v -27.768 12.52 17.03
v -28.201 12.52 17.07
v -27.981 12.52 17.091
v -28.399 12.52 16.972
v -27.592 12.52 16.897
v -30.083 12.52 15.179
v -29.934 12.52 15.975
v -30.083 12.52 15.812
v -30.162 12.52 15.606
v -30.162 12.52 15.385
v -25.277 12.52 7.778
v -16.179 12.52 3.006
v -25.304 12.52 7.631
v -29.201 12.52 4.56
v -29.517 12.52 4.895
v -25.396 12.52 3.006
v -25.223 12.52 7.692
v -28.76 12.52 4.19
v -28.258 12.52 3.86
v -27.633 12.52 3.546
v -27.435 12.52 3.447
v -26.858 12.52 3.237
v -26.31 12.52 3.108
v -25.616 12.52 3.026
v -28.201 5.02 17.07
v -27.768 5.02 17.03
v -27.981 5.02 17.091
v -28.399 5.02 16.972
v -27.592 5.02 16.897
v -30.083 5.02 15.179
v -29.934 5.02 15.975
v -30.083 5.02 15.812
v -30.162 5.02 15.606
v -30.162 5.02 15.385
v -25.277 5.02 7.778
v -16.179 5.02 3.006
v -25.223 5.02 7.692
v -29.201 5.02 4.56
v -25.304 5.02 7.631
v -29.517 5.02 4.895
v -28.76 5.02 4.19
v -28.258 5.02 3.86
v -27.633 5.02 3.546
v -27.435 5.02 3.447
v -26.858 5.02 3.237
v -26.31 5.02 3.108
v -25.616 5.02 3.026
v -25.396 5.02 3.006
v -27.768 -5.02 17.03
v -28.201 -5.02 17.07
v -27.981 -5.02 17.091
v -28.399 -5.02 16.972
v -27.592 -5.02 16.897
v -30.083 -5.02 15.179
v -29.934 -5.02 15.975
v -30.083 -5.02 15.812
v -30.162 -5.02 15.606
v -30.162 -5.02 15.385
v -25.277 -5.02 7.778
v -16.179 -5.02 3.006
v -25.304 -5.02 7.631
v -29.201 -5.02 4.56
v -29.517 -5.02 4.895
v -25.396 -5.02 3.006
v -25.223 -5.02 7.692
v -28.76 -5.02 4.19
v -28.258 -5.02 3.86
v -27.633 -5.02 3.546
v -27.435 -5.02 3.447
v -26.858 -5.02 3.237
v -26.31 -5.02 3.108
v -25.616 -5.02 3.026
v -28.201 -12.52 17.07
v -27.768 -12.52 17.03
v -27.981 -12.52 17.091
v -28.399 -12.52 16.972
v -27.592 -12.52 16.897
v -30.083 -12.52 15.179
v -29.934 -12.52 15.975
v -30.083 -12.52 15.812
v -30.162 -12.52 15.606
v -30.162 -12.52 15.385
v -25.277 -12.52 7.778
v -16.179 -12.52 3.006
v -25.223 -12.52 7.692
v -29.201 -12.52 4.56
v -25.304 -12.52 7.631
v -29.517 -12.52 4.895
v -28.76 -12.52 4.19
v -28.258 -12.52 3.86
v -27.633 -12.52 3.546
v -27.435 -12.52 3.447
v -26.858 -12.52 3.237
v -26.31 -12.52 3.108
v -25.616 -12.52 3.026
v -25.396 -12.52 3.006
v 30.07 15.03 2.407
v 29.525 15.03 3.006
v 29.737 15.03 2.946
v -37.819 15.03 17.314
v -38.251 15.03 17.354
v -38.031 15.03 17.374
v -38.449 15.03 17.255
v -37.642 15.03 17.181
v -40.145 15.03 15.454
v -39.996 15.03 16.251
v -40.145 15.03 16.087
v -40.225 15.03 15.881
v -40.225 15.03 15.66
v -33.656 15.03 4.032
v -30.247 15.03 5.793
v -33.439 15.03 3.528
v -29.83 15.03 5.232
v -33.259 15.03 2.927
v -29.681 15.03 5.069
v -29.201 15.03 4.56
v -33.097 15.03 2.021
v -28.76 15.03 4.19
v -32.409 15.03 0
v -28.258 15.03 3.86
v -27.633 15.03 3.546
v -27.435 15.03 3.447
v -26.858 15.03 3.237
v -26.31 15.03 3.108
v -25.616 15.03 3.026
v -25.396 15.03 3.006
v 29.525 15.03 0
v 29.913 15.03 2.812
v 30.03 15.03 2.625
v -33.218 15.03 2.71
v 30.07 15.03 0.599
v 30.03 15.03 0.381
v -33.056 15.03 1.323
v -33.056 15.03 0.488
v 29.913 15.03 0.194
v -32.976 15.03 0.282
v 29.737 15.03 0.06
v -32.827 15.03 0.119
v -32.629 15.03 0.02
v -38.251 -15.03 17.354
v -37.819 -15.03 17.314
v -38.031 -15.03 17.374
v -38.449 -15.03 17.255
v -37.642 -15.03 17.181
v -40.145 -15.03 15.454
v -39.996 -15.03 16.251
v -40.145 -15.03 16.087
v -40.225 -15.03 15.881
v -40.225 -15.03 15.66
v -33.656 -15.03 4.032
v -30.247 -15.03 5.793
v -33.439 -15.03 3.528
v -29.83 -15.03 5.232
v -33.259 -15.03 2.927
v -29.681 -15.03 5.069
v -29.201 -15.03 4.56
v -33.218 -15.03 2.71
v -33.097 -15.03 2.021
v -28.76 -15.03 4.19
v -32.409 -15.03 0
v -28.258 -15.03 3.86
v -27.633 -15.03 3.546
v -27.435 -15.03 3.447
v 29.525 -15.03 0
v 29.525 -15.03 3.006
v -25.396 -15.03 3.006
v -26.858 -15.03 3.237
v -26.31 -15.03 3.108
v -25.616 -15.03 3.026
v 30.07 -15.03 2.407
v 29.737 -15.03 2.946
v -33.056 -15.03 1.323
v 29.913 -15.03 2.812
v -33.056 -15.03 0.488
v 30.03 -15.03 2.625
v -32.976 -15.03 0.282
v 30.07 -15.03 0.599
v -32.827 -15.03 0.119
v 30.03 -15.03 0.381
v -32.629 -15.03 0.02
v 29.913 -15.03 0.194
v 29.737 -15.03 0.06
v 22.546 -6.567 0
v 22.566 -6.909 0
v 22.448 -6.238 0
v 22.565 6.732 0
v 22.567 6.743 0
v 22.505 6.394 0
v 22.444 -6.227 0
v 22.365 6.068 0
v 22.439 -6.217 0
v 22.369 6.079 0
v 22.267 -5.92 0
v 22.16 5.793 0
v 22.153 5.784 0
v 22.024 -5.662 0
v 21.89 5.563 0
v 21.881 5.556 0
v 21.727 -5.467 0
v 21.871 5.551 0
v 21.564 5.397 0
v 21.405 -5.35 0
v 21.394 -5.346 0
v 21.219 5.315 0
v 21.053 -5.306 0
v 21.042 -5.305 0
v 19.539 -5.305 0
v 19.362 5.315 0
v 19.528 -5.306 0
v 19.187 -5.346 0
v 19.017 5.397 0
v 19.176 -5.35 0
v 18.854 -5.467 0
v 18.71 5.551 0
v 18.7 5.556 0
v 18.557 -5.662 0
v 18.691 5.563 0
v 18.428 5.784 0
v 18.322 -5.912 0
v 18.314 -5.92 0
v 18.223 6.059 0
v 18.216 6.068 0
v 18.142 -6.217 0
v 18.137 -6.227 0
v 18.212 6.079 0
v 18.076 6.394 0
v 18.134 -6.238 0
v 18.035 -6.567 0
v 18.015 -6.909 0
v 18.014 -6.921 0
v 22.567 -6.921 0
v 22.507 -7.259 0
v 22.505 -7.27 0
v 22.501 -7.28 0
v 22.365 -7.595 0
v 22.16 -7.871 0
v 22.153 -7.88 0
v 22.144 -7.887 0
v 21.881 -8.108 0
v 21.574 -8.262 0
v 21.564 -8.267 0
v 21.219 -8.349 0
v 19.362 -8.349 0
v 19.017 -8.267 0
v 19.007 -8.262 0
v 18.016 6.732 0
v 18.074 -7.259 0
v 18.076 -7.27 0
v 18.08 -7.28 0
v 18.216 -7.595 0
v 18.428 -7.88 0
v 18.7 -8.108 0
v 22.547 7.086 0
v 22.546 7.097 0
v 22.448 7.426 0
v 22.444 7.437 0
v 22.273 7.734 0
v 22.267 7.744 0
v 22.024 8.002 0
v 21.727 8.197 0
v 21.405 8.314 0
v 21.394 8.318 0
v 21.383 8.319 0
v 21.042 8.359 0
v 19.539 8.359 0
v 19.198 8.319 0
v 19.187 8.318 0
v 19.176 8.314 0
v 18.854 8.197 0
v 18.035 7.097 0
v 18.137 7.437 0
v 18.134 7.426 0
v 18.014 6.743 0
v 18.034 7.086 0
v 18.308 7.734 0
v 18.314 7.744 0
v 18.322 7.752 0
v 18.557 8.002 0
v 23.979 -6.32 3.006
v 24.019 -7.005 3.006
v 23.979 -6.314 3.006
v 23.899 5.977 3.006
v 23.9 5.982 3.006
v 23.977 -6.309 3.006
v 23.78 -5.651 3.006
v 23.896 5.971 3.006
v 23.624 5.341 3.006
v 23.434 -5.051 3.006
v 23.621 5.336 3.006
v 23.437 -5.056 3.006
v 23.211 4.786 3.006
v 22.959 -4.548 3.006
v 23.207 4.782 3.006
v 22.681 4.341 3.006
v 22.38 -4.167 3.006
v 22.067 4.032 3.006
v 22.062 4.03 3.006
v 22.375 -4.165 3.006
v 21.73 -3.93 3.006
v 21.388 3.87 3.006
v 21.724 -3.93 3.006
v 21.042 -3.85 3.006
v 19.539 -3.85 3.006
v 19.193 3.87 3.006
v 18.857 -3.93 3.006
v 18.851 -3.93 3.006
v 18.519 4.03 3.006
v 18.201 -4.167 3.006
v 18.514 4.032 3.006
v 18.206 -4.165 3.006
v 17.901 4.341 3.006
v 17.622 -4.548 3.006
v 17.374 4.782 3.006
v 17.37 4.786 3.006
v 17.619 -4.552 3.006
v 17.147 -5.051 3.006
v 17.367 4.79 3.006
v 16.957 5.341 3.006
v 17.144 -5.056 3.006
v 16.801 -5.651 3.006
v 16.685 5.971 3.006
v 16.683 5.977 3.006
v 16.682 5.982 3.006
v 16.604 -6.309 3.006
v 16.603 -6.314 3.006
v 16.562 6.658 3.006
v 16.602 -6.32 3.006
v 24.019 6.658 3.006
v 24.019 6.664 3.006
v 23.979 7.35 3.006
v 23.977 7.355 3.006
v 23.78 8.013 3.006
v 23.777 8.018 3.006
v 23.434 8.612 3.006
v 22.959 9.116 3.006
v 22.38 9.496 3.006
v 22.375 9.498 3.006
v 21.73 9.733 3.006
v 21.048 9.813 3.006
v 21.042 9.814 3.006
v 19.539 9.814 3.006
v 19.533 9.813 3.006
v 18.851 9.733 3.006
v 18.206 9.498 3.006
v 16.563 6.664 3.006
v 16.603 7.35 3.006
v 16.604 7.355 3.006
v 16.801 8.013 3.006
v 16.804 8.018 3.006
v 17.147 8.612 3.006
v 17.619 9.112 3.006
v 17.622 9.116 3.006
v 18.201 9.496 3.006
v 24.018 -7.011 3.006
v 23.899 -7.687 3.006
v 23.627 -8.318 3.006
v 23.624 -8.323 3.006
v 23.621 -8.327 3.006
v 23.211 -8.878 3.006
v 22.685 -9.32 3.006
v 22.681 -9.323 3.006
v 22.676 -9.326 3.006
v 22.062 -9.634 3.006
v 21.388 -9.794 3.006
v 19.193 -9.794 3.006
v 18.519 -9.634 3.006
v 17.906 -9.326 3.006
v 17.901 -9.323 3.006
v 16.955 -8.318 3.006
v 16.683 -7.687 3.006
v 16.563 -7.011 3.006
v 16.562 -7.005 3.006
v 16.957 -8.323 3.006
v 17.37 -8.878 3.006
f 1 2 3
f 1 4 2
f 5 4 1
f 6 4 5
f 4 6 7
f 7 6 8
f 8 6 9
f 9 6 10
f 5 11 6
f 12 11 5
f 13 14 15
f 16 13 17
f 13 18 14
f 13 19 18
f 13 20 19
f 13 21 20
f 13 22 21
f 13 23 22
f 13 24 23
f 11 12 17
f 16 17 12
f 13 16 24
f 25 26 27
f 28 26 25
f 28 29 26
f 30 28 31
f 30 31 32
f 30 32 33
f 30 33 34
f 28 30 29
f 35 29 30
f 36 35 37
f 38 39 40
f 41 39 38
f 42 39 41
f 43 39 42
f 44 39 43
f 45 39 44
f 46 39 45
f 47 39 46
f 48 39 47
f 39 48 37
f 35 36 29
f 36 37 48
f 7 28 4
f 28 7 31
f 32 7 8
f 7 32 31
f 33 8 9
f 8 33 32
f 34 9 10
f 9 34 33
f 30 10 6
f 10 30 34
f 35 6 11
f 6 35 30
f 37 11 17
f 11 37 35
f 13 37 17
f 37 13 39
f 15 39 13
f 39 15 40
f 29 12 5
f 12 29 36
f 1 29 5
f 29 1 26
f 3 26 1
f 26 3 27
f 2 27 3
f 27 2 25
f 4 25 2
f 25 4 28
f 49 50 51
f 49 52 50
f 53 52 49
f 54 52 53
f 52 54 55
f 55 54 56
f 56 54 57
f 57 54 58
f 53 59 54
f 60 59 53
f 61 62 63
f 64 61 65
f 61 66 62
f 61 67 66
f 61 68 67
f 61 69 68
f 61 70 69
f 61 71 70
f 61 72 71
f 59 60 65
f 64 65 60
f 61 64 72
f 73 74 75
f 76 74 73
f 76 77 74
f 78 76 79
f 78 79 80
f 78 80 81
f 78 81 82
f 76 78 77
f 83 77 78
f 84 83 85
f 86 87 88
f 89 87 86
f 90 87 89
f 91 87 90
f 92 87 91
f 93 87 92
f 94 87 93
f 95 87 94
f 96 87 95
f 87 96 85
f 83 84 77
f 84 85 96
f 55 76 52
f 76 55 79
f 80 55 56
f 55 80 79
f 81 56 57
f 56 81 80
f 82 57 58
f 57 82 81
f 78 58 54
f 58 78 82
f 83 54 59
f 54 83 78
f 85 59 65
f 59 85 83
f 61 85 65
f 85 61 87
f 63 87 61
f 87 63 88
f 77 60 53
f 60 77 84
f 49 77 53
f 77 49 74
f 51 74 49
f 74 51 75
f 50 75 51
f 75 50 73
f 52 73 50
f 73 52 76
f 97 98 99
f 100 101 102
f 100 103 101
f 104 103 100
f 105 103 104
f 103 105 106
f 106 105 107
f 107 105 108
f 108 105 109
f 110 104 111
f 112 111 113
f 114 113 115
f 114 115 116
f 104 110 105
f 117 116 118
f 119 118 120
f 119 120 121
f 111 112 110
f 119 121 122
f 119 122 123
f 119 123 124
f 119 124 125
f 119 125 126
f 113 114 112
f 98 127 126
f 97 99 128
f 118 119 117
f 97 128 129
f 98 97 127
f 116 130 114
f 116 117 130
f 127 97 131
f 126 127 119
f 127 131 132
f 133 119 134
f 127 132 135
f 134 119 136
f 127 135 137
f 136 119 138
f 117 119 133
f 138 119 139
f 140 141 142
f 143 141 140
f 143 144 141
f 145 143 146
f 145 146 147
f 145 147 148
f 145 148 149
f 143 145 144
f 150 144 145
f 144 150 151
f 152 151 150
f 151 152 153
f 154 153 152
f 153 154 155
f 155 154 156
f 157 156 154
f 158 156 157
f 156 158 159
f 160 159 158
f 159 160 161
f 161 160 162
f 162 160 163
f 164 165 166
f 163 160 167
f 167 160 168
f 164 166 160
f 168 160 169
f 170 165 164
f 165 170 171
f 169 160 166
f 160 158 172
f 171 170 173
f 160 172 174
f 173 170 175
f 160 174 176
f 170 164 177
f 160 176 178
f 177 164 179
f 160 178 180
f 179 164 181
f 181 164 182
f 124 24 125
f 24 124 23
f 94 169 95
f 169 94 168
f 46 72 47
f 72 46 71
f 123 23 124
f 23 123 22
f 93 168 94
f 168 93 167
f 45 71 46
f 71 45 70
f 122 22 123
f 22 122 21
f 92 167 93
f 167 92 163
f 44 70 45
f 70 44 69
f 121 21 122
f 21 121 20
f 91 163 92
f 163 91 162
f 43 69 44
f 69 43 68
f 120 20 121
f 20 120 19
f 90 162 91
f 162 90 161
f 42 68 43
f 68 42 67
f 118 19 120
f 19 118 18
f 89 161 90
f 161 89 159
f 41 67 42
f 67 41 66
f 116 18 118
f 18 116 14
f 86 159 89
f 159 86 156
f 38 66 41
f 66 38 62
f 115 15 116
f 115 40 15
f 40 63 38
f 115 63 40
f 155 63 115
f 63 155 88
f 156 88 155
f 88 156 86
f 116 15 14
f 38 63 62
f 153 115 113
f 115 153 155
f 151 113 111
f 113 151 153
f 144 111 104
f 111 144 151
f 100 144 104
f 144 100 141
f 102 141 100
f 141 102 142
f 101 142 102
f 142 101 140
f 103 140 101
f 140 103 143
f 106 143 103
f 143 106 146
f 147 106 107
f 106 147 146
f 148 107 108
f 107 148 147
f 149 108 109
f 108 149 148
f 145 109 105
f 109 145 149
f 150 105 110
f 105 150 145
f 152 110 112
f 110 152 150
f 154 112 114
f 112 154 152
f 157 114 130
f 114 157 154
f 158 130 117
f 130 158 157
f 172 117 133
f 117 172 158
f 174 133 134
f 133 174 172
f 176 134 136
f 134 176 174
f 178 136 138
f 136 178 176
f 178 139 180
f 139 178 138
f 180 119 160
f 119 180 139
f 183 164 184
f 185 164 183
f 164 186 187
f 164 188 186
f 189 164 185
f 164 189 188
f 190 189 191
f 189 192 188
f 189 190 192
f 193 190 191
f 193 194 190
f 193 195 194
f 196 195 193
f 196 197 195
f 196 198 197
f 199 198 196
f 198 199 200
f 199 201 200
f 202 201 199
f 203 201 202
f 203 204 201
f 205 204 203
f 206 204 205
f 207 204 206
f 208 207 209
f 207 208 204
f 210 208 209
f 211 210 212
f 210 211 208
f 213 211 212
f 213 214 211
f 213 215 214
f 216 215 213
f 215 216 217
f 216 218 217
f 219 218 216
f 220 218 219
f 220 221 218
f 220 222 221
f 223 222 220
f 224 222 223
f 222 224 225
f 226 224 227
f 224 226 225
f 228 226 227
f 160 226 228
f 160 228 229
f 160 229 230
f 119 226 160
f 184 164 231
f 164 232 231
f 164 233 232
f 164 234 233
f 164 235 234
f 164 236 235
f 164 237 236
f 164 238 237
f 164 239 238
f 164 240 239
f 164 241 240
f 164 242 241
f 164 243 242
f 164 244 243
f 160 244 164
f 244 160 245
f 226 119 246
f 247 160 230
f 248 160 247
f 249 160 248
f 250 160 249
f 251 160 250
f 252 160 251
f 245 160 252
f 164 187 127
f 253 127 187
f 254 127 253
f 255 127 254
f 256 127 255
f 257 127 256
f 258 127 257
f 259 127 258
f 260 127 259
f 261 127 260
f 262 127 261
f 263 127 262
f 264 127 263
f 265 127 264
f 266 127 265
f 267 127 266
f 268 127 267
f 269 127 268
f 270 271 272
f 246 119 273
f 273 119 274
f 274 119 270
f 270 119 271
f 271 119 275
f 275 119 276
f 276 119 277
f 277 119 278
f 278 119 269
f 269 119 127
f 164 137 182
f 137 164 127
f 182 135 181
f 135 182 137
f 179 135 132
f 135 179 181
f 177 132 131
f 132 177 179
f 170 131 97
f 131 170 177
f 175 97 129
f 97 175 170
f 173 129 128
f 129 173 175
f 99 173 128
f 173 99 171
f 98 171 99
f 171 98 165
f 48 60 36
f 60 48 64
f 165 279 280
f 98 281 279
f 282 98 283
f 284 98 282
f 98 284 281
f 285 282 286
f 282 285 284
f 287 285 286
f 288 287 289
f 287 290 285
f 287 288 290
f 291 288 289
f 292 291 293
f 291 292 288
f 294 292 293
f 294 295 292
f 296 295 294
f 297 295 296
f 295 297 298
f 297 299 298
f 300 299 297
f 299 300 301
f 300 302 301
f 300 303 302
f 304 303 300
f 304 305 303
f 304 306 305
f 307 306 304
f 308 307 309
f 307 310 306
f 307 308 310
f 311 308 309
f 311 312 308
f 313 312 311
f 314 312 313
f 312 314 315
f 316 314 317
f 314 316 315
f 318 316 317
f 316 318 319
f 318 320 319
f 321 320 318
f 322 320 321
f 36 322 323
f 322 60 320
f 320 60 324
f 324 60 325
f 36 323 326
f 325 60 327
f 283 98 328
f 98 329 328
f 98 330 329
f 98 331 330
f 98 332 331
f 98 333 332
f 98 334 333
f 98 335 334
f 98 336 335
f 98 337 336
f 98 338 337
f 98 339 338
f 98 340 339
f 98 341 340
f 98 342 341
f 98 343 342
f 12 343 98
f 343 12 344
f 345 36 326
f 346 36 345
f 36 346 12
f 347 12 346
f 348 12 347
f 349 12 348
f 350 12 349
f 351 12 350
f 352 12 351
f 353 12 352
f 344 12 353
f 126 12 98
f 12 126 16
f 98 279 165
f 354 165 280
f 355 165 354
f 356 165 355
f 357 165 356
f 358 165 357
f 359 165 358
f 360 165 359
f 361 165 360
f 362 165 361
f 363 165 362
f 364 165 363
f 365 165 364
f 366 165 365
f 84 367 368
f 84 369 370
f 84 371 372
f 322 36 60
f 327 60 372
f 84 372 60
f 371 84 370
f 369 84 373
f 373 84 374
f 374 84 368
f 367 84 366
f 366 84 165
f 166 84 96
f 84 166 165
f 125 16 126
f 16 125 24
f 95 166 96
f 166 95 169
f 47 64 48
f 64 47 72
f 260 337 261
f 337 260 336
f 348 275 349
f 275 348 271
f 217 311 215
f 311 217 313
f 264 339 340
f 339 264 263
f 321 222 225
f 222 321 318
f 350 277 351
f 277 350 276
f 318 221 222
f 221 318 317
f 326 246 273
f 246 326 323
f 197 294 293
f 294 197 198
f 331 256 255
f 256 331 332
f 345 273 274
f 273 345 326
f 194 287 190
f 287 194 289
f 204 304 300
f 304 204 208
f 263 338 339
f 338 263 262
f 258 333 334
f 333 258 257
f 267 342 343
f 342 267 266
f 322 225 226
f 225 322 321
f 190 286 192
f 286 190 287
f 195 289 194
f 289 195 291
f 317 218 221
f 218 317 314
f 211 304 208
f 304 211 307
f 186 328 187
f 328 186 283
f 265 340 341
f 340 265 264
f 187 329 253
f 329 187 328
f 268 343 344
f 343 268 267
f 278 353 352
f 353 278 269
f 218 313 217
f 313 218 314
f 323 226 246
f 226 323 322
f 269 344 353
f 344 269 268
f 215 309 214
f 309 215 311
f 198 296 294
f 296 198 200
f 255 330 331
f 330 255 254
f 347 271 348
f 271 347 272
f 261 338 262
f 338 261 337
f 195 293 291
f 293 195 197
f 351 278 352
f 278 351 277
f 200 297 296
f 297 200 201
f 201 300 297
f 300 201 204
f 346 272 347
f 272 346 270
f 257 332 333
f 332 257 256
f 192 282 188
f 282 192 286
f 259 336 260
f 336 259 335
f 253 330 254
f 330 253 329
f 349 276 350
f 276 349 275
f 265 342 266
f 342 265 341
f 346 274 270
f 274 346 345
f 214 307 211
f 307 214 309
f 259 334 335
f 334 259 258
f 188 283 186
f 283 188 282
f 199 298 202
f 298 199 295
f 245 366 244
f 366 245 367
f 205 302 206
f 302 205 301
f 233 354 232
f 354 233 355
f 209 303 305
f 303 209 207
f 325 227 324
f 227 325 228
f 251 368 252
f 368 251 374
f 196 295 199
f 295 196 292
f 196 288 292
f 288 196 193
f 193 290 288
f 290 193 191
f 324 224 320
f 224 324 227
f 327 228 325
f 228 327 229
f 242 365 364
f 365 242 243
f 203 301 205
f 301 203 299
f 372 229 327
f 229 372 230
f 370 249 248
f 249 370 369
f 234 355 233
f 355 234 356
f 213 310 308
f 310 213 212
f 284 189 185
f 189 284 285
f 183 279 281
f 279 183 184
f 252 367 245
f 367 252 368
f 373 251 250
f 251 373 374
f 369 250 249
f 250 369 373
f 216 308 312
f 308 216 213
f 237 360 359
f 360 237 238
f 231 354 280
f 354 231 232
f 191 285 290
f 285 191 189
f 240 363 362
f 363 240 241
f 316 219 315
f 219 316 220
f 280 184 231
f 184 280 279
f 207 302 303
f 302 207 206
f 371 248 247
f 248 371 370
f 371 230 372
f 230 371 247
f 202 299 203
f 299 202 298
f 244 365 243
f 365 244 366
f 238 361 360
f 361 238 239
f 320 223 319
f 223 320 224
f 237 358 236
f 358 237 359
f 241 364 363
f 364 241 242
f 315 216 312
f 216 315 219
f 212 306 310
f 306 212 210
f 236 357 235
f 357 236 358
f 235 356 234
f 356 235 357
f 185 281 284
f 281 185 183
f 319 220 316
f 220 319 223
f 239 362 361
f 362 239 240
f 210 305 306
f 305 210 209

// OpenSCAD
//------------------------------------------------------------------
/*

Angle Brackets

*/
//------------------------------------------------------------------
/* [Global] */

/*[General]*/
bracket_angle = 123;
bracket_length = 30;
wall_thickness = 3;

/*[Arm1]*/
arm1_length = 60;
arm1_holes = 2;
arm1_hole_style = "countersunk"; // [plain,countersunk]
arm1_hole_diameter = 3;
arm1_hole_spacing = 0.6; // [0:0.05:1]
arm1_hole_position = 0.85; // [0:0.05:1]
arm1_hole_elongation = 1.0;

/*[Arm2]*/
arm2_length = 19;
arm2_holes = 0;
arm2_hole_style = "countersunk"; // [plain,countersunk]
arm2_hole_diameter = 4.8;
arm2_hole_spacing = 0.4; // [0:0.05:1]
arm2_hole_position = 0.7; // [0:0.05:1]
arm2_hole_elongation = 0.0;

/*[Webs]*/
number_of_webs = 0;
web_size = 0.5; // [0:0.05:1]
web_spacing = 0.25; // [0:0.05:1]

/*[Hooks]*/
number_of_hooks = 2;
hook_size = 0.7; // [0:0.05:1] Relative to arm2 size
hook_width = wall_thickness * 2.5;
hook_spacing = 0.25; // [0:0.05:1]
hook_opening_size = 5.3;

/*[Fillets]*/
fillet_factor = 2.0;
rounding_factor = 0.2; // [0:0.05:1]

/* [Hidden] */
//------------------------------------------------------------------
// Set the scaling value to compensate for print shrinkage

//scale = 1/0.995; // ABS ~0.5% shrinkage
scale = 1/0.998; // PLA ~0.2% shrinkage

function dim(x) = scale * x;

//------------------------------------------------------------------
// derived values

bracket_l = dim(bracket_length);
arm1 = dim(arm1_length);
arm2 = dim(arm2_length);
wall_t = dim(wall_thickness);
arm1_hole_r = dim(arm1_hole_diameter/2);
arm2_hole_r = dim(arm2_hole_diameter/2);

//------------------------------------------------------------------
// control the number of facets on cylinders

facet_epsilon = 0.01;
function facets(r) = 180 / acos(1 - (facet_epsilon / r));

// small tweak to avoid differencing artifacts
epsilon = 0.05;

//------------------------------------------------------------------
// rounded/filleted edges

module outset(d=1) {
  minkowski() {
    circle(r=d, $fn=facets(d));
    children(0);
  }
}

module inset(d=1) {
  render() inverse() outset(d=d) inverse() children(0);
}

module inverse() {
  difference() {
    square(1e5, center=true);
    children(0);
  }
}

module rounded(r=1) {
  outset(d=r) inset(d=r) children(0);
}

module filleted(r=1) {
  inset(d=r) render() outset(d=r) children(0);
}

//------------------------------------------------------------------

module hole(r, style) {
  if (style == "countersunk") {
    if (r > wall_t) {
      points = [
        [0,0],
        [(2 * r) - wall_t, 0],
        [2 * r, wall_t + (2 * epsilon)],
        [0, wall_t + (2 * epsilon)]
      ];
      rotate_extrude($fn=facets(r)) polygon(points = points);
    } else {
      points = [
        [0,0],
        [r, 0],
        [r, wall_t - r],
        [2 * r, wall_t + (2 * epsilon)],
        [0, wall_t + (2 * epsilon)]
      ];
      rotate_extrude($fn=facets(r)) polygon(points = points);
    }
  } else {
    // plain hole
    cylinder(h=wall_t + (2 * epsilon), r = r, $fn=facets(r));
  }
}

module hole_set(n, r, k, e, style) {
  space = bracket_l/(n - 1 + (2 * k));
  for (i = [1:n]) {
    translate([(k + i - 1) * space, 0, -epsilon]) {
      if (e != 0) {
        hull() {
          translate([0, e * r, 0]) hole(r, style);
          hole(r, style);
        }
      } else {
        hole(r, style);
      }
    }
  }
}

module holes() {
  if (arm1_holes > 0) {
    translate([arm1_hole_position * arm1,0,0]) rotate([-90,-90,0]) {
      hole_set(arm1_holes, arm1_hole_r, arm1_hole_spacing, -arm1_hole_elongation, arm1_hole_style);
    }
  }
  if (arm2_holes > 0) {
    d = arm2_hole_position * arm2;
    c = cos(bracket_angle);
    s = sin(bracket_angle);
    translate([d * c, d * s, 0]) rotate([0,-90,90+bracket_angle]) {
      hole_set(arm2_holes, arm2_hole_r, arm2_hole_spacing, arm2_hole_elongation, arm2_hole_style);
    }
  }
}

module web_profile() {
  c = cos(bracket_angle);
  s = sin(bracket_angle);
  d1 = arm1 * (1-web_size);
  d2 = arm2 * (1-web_size);
  wt = wall_t - epsilon;
  points = [
    [(c + 1) * wt/s, wt],
    [(c * arm2) + (s * wt) - (c * d2), (s * arm2) - (c * wt) - (s * d2)],
    [arm1 - d1, wt],
  ];
  polygon(points=points, convexity=2);
}

module web() {
  linear_extrude(height=wall_t, convexity=2) web_profile();
}

module hook_profile() {
  c = cos(bracket_angle);
  s = sin(bracket_angle);
  cn = cos(bracket_angle - 90);
  sn = sin(bracket_angle - 90);
  d1 = arm1 * (1-hook_size);
  d2 = arm2 * (1-hook_size);
  wt = wall_t - epsilon;
  hook_arm = hook_opening_size + wt;
  points = [
    [c * arm2 + s * wt + cn * hook_arm - wt, wall_t],
    [s * wt + 1.5 * hook_arm, (1 - 2 * rounding_factor) * wall_t],
    [(c * arm2 * hook_size) + (s * wt) + (cn * hook_arm), (s * arm2 * hook_size) - (c * wt) + (sn * hook_arm)],
    [(c * arm2 * hook_size) + (s * wt) + (cn * hook_opening_size), (s * arm2 * hook_size) - (c * wt) + (sn * hook_opening_size)],
    [(c * arm2 * 0.2) + (s * wt) + (cn * hook_opening_size),
      (s * arm2 * 0.2) - (c * wt) + (sn * hook_opening_size)],
    [(c * arm2 * 0.2) + (s * wt),
      (s * arm2 * 0.2) - (c * wt)],
  ];
  rounded(rounding_factor * wall_t) polygon(points=points, convexity=2);
}

module hook() {
  linear_extrude(height=hook_width, convexity=2) hook_profile();
}

module hooks() {
  space = (bracket_l - (number_of_hooks * hook_width)) / (number_of_hooks - 1 + (2 * web_spacing));
  for (i = [1:number_of_hooks]) {
    translate([0, 0, (hook_spacing * space) + (i - 1) * (space + hook_width)]) hook();
  }
}

module webs() {
  space = (bracket_l - (number_of_webs * wall_t)) / (number_of_webs - 1 + (2 * web_spacing)  );
  for (i = [1:number_of_webs]) {
    translate([0, 0, (web_spacing * space) + (i - 1) * (space + wall_t)]) web();
  }
}

module bracket_profile() {
  c = cos(bracket_angle);
  s = sin(bracket_angle);

  points = [
    [arm1, wall_t],
    [arm1, 0],
    [-wall_t, 0],
    [-wall_t, wall_t],
    [c * arm2, s * arm2],
    [(c * arm2) + (s * wall_t), (s * arm2) - (c * wall_t)],
    [(c + 1) * wall_t/s, wall_t],
  ];
  rounded(rounding_factor * wall_t) filleted(fillet_factor * wall_t) polygon(points=points);
}

module bracket() {
  difference() {
    union() {
      linear_extrude(height=bracket_l, convexity=2) bracket_profile();
      if (number_of_webs > 0) {
        webs();
      }
      hooks();
    }
    holes();
  }
}

translate([-arm1/2,bracket_l / 2,0]) rotate([90,0,0]) bracket();

//------------------------------------------------------------------
